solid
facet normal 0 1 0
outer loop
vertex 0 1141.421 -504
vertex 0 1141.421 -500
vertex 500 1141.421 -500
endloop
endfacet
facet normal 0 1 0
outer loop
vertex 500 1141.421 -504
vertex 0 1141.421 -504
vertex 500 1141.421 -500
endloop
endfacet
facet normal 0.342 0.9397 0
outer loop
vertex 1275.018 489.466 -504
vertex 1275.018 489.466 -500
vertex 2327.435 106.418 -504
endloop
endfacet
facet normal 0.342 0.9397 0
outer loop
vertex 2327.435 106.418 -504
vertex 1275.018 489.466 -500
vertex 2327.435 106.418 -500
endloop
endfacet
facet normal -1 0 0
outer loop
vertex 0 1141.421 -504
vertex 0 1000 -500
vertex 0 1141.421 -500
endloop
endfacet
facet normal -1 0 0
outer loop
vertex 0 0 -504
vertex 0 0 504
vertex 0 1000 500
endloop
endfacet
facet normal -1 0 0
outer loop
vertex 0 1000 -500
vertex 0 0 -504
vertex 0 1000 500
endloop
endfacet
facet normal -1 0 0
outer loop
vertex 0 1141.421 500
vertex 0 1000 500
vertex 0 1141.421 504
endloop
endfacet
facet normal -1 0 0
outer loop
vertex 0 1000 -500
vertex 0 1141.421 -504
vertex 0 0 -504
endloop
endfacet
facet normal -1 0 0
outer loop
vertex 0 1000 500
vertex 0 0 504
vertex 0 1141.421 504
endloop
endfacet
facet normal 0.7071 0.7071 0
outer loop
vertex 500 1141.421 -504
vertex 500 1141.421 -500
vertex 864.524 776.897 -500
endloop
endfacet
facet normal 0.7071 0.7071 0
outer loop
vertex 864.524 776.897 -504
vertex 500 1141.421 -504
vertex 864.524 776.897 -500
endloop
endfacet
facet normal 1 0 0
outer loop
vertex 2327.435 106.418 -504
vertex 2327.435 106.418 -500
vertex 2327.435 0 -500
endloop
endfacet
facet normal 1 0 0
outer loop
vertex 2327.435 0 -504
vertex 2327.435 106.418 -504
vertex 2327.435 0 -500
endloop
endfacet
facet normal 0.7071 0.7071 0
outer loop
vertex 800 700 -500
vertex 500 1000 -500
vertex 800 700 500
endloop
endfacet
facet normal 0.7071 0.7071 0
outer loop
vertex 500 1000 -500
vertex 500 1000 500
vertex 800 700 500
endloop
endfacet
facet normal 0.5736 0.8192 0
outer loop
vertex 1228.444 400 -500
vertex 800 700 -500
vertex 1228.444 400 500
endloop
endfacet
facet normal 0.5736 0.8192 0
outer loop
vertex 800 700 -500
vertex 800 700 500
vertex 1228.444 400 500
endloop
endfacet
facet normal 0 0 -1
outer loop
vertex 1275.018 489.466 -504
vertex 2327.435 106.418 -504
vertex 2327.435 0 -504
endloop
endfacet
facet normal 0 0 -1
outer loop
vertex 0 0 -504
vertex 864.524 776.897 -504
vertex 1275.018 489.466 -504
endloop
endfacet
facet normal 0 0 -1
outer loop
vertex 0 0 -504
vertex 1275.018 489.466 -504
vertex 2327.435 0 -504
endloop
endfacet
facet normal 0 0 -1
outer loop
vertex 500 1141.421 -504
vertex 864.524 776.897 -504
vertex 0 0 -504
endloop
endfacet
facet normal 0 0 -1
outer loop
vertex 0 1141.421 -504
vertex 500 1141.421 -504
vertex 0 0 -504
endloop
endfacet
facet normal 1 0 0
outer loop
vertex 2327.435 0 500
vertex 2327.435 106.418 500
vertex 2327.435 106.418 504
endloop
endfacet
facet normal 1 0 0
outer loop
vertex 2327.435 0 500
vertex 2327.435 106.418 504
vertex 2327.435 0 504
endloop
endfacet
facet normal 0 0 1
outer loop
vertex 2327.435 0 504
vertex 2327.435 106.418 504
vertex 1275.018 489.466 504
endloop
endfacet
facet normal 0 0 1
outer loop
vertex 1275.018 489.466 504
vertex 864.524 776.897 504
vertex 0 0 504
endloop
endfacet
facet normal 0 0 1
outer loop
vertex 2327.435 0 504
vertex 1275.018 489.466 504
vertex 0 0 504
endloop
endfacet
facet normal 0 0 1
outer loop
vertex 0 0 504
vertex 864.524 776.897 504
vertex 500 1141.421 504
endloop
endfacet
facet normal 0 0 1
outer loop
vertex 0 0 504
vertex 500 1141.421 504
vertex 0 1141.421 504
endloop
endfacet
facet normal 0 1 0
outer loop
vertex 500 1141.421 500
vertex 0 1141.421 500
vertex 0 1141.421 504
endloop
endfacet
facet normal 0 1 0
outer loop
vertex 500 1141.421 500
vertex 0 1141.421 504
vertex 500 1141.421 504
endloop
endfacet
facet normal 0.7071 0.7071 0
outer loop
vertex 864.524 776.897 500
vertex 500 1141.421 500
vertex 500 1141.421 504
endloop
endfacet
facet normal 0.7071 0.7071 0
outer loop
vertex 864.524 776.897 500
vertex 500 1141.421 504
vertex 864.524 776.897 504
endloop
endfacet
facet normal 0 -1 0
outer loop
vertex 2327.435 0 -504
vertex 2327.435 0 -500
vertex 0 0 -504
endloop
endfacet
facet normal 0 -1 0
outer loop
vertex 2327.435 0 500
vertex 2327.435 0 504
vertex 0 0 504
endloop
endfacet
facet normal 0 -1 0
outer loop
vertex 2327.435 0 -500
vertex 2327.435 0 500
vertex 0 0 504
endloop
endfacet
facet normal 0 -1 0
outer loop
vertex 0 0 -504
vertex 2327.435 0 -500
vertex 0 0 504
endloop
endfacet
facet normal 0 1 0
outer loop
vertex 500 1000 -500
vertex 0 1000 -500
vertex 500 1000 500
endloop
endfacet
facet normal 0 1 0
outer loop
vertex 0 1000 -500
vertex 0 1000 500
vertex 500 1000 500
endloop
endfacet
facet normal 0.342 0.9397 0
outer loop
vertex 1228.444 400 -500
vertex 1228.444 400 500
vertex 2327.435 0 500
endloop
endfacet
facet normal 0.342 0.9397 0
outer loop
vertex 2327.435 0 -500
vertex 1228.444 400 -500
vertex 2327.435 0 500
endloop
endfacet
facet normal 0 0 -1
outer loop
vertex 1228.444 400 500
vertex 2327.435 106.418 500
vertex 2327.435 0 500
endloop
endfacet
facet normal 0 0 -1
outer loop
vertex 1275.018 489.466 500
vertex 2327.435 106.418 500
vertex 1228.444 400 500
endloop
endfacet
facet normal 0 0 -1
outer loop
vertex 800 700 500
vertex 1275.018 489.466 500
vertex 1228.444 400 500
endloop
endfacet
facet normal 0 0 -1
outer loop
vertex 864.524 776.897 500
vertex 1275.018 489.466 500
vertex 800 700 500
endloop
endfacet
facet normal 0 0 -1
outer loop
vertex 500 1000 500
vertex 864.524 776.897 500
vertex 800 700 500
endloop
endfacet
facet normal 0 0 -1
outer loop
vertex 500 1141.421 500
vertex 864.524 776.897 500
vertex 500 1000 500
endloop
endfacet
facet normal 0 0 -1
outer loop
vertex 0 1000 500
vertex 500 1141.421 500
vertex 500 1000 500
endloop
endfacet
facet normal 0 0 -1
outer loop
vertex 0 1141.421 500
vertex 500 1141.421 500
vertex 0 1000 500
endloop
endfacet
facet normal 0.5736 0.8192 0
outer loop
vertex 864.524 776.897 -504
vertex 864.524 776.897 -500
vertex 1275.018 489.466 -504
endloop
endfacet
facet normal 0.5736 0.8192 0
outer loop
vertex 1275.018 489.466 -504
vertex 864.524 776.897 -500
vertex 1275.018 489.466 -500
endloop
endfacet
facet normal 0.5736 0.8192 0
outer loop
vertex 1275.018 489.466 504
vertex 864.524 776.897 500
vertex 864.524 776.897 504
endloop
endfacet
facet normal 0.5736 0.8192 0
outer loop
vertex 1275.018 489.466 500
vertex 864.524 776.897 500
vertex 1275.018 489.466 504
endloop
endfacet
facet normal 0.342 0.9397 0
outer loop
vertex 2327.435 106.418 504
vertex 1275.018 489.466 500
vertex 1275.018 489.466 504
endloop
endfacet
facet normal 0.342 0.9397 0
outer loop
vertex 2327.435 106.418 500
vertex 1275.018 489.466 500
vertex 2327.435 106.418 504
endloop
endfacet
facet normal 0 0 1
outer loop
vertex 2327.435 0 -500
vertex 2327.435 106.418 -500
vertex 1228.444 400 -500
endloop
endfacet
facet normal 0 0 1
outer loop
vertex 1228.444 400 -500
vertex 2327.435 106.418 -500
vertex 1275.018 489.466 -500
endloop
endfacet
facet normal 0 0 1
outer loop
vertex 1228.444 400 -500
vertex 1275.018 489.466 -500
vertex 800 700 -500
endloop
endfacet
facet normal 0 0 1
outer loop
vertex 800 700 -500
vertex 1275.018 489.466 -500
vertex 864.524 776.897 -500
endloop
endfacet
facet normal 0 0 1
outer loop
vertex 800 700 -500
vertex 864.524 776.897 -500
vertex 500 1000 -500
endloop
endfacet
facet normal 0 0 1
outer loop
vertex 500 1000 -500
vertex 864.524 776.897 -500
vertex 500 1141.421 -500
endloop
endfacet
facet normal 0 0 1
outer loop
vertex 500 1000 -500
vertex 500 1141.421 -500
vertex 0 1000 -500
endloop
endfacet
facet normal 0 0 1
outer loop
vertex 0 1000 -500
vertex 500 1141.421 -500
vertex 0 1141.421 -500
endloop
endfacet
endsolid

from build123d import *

# Parameters (mm, degrees)
AUFSATZ_LINEAR_AUSTRAGEN1_DEPTH = 500
AUFSATZ_LINEAR_AUSTRAGEN2_DEPTH = 4


with BuildPart() as part:
    # Skizze1 → Aufsatz-Linear austragen1 (new body, symmetric)
    with BuildSketch(Plane.XY):
        Polygon((0, 0), (0, 1000), (500, 1000), (800, 700), (1228.444402023, 400), (2327.435369805, 0), align=None)
    extrude(amount=AUFSATZ_LINEAR_AUSTRAGEN1_DEPTH, both=True)

    # Skizze3 → Aufsatz-Linear austragen2 (add)
    with BuildSketch(Plane.XY.offset(500)):
        Polygon((0, 0), (0, 1141.421356237), (500, 1141.421356237), (864.524295393, 776.897060844), (1275.017704404, 489.466481469), (2327.435369805, 106.417777248), (2327.435369805, 0), align=None)
    aufsatz_linear_austragen2 = extrude(amount=AUFSATZ_LINEAR_AUSTRAGEN2_DEPTH)

    # Spiegeln1: Aufsatz-Linear austragen2 across plane
    add(aufsatz_linear_austragen2.mirror(Plane(origin=(0, 0, 0), x_dir=(1, 0, 0), z_dir=(0, 0, -1))))


solid = part.part
